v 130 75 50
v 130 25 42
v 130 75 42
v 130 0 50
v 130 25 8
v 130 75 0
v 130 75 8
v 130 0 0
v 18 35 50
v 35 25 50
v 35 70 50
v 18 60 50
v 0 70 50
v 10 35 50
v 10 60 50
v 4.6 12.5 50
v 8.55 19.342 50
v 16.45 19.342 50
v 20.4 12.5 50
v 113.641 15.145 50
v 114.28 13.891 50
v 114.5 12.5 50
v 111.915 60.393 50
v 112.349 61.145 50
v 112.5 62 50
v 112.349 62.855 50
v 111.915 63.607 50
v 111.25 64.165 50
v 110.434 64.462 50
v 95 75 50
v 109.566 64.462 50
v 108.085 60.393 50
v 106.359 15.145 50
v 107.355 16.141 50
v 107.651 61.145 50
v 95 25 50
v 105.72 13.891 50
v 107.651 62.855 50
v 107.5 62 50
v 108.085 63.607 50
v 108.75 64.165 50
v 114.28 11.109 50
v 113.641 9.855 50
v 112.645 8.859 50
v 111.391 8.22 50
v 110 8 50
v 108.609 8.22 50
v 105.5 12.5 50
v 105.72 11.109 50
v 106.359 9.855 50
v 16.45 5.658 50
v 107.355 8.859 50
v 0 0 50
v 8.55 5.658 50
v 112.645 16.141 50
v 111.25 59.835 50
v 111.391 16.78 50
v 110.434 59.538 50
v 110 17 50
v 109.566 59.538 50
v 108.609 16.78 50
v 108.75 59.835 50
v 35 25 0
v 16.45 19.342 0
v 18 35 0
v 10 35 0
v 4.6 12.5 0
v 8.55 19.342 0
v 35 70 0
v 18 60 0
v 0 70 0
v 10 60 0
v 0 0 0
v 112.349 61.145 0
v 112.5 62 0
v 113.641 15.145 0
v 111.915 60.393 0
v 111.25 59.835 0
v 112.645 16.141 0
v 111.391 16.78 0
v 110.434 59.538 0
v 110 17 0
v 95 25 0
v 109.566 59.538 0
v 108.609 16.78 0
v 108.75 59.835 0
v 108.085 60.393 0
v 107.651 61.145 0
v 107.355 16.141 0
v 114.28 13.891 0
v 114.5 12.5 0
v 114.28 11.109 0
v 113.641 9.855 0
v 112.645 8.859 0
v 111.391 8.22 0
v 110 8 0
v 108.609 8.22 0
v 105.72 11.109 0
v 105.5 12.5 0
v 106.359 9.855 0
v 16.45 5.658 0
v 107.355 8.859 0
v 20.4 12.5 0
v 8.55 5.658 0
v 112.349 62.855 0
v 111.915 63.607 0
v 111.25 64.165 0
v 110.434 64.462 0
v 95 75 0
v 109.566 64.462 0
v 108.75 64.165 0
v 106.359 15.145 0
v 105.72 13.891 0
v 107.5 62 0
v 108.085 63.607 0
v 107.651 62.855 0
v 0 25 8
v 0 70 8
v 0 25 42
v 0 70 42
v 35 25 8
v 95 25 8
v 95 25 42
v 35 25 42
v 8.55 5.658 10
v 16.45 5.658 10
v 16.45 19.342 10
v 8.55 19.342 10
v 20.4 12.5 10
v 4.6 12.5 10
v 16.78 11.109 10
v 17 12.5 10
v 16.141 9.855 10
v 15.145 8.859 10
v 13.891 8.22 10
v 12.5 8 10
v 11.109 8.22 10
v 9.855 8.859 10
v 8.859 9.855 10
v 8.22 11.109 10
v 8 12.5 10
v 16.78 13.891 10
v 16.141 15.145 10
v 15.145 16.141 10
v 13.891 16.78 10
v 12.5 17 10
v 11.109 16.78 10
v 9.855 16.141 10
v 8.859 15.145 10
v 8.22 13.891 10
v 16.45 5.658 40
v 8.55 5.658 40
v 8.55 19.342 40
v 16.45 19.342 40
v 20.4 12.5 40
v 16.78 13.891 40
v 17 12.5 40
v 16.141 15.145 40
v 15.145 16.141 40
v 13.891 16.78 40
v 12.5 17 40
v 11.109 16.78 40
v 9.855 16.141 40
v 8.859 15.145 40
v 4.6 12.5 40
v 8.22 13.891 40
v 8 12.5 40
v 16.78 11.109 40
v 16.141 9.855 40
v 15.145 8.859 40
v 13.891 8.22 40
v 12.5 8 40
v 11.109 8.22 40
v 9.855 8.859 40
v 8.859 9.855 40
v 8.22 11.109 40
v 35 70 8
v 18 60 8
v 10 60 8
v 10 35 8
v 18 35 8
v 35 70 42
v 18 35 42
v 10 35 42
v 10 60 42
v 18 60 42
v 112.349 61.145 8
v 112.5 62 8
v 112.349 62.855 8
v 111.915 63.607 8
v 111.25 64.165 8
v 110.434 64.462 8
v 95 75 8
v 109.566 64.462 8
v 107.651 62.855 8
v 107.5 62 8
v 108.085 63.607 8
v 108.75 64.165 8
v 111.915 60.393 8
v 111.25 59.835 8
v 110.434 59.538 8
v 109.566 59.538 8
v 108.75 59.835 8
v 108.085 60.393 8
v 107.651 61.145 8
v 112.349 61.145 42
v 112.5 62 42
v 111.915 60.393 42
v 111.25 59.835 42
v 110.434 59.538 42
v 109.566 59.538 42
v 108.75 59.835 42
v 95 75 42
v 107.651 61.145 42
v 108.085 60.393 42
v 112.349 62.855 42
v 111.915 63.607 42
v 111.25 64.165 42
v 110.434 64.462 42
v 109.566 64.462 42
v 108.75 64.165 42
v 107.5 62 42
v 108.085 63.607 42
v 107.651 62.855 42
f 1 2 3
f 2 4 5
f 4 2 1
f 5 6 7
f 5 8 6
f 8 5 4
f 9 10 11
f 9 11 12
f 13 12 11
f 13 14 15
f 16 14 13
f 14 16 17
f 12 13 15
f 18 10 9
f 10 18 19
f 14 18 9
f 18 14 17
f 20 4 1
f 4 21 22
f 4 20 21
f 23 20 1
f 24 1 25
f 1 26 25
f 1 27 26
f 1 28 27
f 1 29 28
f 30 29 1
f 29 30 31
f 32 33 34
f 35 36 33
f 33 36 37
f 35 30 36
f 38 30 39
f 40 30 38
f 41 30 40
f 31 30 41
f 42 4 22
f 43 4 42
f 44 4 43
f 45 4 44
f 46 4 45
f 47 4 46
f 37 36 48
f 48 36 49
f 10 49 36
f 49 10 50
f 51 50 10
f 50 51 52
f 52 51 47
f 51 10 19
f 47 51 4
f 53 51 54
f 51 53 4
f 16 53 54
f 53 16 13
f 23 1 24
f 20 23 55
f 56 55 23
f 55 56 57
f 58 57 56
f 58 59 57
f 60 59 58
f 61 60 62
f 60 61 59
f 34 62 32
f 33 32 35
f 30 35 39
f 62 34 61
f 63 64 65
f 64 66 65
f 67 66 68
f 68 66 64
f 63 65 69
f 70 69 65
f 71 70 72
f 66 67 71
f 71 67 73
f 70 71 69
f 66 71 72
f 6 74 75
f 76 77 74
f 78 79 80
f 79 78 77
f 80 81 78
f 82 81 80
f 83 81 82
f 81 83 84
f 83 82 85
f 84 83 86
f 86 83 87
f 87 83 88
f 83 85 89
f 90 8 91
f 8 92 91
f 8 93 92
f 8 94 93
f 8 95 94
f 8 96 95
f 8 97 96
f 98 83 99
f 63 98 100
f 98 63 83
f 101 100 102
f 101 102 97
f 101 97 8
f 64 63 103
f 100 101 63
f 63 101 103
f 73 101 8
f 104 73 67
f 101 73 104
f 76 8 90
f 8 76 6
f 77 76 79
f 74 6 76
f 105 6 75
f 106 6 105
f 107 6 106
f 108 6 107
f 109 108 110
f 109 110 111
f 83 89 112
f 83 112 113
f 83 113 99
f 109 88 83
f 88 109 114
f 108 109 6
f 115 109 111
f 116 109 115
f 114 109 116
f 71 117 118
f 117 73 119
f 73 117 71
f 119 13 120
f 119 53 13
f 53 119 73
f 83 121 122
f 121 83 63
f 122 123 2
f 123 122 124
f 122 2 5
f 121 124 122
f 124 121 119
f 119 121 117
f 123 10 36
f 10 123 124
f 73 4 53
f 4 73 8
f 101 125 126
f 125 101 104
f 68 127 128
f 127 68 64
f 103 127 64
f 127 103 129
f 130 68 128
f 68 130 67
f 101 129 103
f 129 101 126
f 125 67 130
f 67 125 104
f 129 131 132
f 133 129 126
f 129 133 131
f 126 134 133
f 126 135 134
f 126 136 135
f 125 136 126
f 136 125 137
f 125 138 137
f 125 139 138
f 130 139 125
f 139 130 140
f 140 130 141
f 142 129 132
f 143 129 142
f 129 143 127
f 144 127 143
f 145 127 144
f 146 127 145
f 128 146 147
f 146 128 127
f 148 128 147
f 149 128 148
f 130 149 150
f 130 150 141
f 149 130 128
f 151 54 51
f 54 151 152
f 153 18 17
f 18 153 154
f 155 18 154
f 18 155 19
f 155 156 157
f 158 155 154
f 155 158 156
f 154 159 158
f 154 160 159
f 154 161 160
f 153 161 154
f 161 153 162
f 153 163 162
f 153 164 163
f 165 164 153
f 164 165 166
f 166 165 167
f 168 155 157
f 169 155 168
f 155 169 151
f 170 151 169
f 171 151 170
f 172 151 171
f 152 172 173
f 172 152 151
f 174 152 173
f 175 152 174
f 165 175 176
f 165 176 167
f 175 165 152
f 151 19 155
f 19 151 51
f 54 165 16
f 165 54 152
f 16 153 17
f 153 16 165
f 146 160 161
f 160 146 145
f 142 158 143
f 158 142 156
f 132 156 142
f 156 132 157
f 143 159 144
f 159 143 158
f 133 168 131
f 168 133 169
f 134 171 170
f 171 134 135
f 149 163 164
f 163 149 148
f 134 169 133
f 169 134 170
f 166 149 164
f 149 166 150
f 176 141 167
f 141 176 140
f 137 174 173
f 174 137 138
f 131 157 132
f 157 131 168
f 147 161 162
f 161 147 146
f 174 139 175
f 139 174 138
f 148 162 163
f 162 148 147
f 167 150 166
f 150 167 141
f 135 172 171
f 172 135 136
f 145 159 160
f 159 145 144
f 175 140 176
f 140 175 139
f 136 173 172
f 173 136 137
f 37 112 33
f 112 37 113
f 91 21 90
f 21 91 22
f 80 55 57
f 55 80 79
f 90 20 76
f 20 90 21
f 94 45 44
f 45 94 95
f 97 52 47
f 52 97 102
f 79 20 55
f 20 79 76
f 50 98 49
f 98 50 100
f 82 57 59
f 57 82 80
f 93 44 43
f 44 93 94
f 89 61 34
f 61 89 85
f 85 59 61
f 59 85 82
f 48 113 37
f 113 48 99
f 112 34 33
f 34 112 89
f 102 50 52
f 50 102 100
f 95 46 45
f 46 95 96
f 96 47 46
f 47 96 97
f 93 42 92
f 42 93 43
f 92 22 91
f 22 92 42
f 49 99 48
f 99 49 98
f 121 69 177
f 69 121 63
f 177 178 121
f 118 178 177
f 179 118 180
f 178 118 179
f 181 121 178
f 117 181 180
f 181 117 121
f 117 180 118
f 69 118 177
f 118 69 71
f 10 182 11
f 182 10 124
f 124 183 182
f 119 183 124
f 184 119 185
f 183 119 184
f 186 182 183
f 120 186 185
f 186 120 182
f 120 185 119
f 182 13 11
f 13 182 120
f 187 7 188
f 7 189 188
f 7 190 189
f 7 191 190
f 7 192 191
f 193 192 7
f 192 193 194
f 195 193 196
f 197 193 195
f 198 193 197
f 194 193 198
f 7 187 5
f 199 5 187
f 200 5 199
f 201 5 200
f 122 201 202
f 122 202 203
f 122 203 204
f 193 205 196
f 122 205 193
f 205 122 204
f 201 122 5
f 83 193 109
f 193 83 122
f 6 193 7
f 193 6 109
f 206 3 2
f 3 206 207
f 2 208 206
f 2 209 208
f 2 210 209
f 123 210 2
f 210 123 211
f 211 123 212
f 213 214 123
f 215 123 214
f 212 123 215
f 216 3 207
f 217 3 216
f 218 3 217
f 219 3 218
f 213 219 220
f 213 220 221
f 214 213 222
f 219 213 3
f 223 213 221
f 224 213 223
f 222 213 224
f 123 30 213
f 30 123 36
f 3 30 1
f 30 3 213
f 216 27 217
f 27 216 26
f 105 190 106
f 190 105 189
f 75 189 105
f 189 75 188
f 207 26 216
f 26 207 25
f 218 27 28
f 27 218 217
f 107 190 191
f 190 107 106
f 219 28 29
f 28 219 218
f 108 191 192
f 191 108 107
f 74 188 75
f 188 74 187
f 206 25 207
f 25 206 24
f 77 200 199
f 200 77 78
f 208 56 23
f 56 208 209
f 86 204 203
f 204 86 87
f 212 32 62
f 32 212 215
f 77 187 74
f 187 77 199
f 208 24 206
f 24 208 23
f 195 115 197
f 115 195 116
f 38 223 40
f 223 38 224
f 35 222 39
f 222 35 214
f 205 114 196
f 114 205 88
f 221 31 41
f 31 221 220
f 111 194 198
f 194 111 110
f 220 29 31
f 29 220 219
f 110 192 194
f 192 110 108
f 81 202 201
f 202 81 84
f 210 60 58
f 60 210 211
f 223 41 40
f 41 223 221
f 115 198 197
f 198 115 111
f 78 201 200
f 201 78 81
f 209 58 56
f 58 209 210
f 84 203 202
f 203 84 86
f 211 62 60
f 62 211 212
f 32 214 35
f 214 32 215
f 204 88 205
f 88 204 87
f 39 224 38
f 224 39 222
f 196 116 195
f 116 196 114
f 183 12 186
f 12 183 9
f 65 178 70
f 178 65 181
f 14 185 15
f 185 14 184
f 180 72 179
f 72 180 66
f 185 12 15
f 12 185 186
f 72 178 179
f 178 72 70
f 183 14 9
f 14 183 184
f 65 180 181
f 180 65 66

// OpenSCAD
difference(){
    union(){
        difference(){
            cube([130,25,50]);
            
            translate([12.5,12.5,0]){
                cylinder(10, r=7.9, $fn=6);
            }
            
            translate([12.5,12.5,40]){
                cylinder(10.5, r=7.9, $fn=6);
            }
            
            translate([12.5,12.5,10]){
                cylinder(30, r=4.5, $fn=20);
            }
            
            translate([110,12.5,0]){
                cylinder(50, d=9, $fn=20);
            }
        }
        
        translate([0,25,0]){
            cube([35, 45, 8]);
        }
        
        translate([0,25,42]){
            cube([35, 45, 8]);
        }
        
        translate([95,25,0]){
            cube([35, 50, 8]);
        }
        
        translate([95,25,42]){
            cube([35, 50, 8]);
        }
    }
    translate([110, 62, 0]){
        cylinder(50, r=2.5, $fn=18);
    }
    translate([10, 35, 0]){
        cube([8, 25, 50]);
    }
}
